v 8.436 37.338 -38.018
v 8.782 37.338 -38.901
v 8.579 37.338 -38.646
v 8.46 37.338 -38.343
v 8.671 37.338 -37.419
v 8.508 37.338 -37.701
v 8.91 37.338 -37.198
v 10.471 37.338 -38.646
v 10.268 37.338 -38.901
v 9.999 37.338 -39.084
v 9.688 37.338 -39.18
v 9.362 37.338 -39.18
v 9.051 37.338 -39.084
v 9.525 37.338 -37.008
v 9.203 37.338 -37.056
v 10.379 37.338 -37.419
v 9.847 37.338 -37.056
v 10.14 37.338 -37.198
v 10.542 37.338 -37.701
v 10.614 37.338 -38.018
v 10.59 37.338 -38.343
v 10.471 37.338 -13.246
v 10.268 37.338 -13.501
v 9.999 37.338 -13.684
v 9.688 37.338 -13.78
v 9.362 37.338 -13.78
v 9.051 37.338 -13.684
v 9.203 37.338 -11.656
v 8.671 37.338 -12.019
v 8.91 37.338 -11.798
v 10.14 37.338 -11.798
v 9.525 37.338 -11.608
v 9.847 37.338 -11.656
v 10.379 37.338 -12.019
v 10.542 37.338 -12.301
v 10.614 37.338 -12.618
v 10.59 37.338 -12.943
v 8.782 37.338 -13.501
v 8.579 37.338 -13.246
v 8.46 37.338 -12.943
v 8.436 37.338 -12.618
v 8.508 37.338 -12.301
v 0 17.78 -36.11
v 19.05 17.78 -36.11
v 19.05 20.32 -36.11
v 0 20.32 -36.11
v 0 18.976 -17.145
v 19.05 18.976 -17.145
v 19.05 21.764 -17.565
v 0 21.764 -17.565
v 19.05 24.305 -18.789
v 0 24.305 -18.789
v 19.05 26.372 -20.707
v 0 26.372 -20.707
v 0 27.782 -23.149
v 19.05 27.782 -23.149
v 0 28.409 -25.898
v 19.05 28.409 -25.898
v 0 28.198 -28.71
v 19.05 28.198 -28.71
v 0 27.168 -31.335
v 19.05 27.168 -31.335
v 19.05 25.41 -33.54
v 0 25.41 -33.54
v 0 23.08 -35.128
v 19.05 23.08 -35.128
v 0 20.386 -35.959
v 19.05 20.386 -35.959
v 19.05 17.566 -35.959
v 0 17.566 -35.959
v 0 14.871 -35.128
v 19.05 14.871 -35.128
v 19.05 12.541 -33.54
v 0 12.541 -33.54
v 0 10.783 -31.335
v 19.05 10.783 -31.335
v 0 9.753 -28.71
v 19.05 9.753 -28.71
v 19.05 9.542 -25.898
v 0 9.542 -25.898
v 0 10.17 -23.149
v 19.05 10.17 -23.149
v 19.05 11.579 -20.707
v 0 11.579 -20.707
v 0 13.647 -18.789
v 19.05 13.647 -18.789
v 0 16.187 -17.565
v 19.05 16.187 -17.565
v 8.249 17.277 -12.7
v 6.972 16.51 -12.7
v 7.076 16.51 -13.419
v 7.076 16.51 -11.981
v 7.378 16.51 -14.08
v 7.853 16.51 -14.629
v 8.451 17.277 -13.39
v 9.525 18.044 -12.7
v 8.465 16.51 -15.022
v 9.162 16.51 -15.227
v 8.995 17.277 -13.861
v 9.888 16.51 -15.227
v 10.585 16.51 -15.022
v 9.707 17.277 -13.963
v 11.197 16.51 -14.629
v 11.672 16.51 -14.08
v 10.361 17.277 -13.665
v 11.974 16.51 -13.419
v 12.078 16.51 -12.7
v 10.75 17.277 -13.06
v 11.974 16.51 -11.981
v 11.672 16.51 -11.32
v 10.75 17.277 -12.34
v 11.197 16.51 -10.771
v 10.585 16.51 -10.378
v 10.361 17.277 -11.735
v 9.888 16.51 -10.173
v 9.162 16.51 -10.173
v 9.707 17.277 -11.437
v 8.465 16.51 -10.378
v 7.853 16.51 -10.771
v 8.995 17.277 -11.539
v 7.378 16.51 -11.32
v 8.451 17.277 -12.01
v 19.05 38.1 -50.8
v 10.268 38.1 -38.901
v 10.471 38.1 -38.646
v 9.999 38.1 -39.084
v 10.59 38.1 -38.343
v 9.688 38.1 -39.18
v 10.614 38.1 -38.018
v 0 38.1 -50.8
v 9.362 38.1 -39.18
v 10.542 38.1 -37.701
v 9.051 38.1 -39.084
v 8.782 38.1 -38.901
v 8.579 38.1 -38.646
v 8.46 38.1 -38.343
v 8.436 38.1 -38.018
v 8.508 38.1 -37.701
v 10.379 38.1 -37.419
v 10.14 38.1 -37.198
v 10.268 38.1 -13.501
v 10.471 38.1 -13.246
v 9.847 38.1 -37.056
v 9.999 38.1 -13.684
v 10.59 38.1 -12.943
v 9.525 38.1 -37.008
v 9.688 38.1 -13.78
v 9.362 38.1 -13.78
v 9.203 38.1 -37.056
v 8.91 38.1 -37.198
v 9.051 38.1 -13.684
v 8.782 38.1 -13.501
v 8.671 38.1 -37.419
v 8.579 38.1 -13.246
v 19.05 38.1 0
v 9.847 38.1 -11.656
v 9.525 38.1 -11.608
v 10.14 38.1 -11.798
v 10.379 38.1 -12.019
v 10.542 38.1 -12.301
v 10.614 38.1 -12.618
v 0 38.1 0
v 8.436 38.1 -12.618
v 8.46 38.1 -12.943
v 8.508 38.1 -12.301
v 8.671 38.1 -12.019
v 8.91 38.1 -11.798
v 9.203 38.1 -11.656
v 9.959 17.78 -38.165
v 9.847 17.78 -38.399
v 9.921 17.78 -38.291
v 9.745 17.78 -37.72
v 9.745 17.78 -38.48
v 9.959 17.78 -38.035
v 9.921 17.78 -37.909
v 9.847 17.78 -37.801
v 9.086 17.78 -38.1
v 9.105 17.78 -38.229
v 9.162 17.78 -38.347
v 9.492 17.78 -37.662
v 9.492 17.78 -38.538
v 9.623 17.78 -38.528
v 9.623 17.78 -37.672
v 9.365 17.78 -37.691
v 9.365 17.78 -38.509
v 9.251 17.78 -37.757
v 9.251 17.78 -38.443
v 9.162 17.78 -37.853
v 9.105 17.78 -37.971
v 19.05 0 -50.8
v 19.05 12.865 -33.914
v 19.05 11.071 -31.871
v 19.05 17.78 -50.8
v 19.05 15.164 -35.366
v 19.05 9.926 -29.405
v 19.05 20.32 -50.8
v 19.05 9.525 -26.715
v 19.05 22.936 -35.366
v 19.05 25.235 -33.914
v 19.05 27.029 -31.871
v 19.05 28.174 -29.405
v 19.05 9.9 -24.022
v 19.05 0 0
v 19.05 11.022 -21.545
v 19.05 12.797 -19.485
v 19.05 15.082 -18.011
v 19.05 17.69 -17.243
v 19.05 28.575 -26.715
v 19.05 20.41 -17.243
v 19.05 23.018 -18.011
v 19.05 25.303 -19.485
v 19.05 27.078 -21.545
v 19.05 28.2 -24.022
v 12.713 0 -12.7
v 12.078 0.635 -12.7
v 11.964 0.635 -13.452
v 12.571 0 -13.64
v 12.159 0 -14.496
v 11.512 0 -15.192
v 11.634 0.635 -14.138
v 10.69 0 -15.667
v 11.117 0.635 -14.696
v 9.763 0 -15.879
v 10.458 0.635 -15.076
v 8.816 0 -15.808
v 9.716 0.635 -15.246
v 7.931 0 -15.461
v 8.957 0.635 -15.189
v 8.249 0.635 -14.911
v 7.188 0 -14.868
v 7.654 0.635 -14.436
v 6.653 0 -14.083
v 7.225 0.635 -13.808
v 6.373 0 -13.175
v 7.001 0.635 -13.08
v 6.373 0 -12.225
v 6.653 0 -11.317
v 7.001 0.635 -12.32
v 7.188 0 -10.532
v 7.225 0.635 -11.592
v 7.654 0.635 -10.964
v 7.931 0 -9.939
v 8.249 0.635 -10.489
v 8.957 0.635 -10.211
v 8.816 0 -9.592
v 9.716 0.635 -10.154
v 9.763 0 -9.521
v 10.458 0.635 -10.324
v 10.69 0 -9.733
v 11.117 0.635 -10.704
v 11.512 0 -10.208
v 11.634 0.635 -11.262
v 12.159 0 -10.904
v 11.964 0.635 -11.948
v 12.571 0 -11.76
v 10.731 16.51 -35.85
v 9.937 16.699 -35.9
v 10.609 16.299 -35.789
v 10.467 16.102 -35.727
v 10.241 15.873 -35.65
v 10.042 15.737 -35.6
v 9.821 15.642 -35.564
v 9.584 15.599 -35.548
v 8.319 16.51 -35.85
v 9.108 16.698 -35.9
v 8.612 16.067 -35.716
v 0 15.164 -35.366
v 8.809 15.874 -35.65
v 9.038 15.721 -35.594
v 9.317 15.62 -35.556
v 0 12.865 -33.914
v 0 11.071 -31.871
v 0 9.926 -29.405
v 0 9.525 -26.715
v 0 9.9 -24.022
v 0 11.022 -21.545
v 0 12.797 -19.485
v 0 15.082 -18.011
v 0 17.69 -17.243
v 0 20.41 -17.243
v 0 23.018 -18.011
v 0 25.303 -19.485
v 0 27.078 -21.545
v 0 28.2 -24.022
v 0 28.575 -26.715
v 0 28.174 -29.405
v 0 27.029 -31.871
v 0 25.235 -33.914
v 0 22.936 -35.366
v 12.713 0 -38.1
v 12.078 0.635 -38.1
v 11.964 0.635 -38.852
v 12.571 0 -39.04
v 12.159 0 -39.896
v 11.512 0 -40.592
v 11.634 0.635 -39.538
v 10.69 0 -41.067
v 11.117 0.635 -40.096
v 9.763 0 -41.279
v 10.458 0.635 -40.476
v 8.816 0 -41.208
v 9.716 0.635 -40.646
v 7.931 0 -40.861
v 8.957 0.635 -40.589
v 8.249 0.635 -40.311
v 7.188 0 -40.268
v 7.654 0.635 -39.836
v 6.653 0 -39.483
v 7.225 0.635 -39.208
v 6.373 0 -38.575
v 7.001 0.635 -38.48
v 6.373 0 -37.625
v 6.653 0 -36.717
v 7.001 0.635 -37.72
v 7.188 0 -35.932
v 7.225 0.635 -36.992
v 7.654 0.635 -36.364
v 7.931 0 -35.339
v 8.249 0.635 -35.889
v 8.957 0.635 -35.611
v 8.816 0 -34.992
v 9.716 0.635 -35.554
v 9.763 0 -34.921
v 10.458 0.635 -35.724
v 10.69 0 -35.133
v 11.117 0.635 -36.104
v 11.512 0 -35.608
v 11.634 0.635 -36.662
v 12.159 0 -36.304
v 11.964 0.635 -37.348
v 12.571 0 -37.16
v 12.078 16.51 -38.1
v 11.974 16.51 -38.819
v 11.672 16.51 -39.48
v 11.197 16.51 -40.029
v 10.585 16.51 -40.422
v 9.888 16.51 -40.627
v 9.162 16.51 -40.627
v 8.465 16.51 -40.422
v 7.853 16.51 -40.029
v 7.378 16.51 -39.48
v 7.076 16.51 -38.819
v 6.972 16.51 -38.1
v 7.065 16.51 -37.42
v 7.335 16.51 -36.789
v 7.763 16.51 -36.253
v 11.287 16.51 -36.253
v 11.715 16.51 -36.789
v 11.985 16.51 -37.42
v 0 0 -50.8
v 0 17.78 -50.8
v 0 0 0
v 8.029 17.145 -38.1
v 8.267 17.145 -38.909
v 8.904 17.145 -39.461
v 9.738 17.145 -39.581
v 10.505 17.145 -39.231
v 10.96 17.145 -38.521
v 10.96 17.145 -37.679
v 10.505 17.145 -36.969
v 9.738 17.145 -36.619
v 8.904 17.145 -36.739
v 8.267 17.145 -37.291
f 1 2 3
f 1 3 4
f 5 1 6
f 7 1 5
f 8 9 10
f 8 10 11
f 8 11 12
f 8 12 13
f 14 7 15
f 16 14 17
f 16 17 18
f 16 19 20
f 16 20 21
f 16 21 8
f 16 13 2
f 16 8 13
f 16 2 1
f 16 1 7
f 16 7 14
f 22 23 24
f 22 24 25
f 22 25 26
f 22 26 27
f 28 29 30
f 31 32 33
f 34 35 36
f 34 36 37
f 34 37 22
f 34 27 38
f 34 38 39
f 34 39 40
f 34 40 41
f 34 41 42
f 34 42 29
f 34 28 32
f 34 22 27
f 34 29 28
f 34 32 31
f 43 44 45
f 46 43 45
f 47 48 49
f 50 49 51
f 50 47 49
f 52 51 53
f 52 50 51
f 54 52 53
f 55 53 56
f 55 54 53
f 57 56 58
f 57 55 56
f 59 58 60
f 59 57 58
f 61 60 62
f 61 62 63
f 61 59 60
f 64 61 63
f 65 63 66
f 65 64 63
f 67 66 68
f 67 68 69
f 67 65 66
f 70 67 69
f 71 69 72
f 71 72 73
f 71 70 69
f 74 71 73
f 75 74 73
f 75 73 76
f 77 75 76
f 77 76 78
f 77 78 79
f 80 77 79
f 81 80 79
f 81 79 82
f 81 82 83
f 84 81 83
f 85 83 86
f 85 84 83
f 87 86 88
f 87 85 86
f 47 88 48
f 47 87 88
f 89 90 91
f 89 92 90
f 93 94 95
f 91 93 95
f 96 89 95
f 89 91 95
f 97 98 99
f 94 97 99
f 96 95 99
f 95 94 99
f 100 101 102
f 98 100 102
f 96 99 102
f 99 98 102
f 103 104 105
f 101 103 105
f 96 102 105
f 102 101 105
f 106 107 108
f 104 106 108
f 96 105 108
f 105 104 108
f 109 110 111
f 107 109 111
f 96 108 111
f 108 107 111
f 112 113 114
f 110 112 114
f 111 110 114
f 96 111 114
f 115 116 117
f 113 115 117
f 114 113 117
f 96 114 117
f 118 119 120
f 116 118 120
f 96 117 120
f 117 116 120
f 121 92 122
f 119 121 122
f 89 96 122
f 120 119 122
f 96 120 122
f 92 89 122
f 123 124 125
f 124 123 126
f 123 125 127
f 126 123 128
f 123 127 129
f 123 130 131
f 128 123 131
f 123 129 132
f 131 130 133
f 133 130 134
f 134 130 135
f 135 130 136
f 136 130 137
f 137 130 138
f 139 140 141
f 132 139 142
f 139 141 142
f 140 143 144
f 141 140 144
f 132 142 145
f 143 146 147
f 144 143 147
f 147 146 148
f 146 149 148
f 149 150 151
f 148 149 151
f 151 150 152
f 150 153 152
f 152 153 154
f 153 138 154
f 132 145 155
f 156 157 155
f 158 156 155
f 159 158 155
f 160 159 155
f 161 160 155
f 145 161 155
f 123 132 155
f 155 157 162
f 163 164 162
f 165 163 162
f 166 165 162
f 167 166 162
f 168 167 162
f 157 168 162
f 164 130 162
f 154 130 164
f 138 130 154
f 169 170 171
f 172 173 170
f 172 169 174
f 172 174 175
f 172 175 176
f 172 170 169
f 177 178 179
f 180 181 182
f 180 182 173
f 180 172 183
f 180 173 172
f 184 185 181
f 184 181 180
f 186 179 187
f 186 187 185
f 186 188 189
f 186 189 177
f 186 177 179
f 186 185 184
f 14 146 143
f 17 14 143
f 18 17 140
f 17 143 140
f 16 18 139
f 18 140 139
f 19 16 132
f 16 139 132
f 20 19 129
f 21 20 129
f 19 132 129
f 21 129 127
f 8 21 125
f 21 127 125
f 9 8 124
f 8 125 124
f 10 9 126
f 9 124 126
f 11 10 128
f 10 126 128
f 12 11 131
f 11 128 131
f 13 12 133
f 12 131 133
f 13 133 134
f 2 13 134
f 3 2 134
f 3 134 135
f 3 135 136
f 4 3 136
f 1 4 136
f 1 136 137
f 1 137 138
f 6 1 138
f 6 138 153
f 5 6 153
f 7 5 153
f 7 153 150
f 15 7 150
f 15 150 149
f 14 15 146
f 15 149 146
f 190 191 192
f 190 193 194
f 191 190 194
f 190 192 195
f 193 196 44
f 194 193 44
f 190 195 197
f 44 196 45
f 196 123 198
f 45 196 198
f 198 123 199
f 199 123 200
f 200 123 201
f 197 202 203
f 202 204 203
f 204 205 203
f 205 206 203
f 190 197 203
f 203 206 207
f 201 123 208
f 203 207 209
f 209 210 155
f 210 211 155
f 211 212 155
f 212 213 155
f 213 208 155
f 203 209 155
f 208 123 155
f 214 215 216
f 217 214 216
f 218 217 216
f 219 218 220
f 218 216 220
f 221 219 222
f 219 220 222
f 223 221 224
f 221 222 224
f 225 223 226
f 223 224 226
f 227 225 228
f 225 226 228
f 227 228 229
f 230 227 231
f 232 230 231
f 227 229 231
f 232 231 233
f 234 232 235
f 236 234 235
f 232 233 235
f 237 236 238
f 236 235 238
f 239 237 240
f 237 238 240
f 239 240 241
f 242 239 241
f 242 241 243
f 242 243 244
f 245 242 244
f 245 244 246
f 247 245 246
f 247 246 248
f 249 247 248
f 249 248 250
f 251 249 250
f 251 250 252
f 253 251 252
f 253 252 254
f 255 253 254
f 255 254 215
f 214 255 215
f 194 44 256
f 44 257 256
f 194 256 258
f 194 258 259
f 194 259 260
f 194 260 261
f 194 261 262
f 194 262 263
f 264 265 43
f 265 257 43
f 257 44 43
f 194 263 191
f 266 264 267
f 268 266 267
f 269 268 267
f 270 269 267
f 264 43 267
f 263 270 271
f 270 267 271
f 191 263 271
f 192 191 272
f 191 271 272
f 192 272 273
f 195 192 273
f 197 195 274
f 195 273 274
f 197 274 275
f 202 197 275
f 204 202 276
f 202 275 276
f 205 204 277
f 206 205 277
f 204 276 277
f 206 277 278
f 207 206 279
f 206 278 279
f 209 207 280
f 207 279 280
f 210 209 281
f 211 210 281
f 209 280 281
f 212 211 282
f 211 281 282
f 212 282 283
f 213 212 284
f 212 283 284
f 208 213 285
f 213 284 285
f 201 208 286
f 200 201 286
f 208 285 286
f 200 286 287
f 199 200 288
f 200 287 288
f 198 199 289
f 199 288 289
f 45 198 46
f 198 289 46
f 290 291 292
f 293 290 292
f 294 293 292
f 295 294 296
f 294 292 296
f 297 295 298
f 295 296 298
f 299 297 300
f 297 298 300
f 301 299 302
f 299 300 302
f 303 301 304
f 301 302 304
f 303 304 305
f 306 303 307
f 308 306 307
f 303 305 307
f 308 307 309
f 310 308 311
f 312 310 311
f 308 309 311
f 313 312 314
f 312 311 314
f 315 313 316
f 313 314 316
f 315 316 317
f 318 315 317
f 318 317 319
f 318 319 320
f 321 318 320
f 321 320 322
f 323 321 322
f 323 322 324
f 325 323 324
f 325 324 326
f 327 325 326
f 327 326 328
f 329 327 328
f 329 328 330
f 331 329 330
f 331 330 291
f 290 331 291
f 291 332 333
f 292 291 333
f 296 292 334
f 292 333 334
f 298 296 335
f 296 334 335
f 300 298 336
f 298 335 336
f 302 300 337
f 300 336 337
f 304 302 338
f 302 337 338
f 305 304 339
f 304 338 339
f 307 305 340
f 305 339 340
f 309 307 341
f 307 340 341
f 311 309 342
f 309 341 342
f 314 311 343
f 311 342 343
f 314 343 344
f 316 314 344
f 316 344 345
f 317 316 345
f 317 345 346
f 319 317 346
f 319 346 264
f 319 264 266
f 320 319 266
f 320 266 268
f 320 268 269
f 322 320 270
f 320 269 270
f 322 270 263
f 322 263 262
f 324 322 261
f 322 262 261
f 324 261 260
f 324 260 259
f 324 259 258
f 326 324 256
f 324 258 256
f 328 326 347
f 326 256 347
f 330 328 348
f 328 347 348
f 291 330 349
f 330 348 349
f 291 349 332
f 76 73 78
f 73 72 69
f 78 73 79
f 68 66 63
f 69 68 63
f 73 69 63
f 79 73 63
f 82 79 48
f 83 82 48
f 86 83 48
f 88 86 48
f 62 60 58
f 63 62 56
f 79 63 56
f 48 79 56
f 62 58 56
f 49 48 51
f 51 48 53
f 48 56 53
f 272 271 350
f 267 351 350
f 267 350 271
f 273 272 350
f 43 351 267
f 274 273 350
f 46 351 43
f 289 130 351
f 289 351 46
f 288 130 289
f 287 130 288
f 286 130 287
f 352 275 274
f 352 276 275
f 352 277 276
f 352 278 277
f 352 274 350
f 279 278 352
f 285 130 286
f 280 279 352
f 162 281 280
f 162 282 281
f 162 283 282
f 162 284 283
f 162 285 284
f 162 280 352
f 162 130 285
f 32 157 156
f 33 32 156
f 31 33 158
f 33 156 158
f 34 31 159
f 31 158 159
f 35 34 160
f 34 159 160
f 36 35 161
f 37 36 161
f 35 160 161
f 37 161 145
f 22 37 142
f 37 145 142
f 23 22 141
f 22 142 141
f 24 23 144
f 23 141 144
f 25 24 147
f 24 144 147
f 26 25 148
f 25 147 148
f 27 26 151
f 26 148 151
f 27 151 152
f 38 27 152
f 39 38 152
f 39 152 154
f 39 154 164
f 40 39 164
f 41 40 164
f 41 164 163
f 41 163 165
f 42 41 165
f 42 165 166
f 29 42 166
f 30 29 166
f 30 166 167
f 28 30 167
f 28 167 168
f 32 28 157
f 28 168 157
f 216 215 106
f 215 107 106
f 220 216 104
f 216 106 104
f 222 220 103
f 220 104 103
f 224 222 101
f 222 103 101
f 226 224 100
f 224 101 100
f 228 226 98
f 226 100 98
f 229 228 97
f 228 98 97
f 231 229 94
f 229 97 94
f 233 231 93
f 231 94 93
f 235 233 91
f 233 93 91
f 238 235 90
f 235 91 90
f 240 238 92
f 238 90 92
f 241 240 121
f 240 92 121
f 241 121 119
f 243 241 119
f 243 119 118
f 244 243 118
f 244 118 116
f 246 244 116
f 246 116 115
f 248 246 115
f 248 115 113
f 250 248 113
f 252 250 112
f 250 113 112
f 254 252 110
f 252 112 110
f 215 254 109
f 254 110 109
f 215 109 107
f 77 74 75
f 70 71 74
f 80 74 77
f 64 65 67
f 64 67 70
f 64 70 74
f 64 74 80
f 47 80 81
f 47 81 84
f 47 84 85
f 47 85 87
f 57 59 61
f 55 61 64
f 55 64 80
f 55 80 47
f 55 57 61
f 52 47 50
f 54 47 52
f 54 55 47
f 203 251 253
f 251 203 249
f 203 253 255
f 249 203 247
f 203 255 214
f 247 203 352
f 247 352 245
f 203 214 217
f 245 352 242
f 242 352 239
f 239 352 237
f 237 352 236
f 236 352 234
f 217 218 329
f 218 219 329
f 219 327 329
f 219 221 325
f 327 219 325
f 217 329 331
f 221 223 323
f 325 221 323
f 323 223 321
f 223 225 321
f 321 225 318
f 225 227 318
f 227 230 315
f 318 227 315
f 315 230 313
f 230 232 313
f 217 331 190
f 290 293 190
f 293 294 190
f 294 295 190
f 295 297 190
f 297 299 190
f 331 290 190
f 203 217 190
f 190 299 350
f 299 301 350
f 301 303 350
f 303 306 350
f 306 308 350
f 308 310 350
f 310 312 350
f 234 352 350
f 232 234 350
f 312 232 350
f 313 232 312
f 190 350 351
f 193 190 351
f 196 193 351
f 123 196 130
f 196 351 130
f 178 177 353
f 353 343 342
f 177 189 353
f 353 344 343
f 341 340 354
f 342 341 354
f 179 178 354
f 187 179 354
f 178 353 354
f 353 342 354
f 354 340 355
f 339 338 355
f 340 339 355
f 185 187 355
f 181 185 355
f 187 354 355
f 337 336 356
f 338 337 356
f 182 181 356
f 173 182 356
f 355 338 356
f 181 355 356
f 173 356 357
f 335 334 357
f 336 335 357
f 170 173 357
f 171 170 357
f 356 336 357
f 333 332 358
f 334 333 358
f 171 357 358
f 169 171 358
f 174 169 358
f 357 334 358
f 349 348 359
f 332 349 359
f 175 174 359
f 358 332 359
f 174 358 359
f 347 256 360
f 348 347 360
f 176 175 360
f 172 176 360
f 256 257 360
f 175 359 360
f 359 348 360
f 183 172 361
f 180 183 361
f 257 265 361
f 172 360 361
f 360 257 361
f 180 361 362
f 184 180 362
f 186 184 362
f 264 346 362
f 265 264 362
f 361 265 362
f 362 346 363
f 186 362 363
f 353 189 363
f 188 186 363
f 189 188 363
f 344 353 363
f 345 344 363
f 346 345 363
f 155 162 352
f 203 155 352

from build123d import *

# Parameters (mm, degrees)
BOSS_EXTRUDE1_DEPTH               = 19.05
F_1_4_20_TAPPED_HOLE1_D           = 5.1054
F_1_4_20_TAPPED_HOLE1_DEPTH       = 16.51
F_1_4_20_TAPPED_HOLE1_CSINK_D     = 6.3754
F_1_4_20_TAPPED_HOLE1_CSINK_ANGLE = 90
F_1_4_20_TAPPED_HOLE1_TIP         = 1.533816902
SKETCH10_R                        = 9.459955788
BOSS_EXTRUDE2_DEPTH               = 19.05
SKETCH11_W                        = 14.690046345
SKETCH11_H                        = 2.54
BOSS_EXTRUDE3_DEPTH               = 19.05
SKETCH8_R                         = 1.0922
CUT_EXTRUDE4_DEPTH                = 0.762


with BuildPart() as part:
    # Sketch2 → Boss-Extrude1 (new body)
    with BuildSketch(Plane(origin=(0, 0, 0), x_dir=(0, 0, -1), z_dir=(1, 0, 0))):
        with BuildLine():
            Line((0, 0), (50.8, 0))
            Line((50.8, 0), (50.8, 17.78))
            Line((50.8, 17.78), (36.109953655, 17.78))
            ThreePointArc((36.109953655, 17.78), (17.145, 19.05), (36.109953655, 20.32))
            Line((36.109953655, 20.32), (50.8, 20.32))
            Line((50.8, 20.32), (50.8, 38.1))
            Line((50.8, 38.1), (0, 38.1))
            Line((0, 38.1), (0, 0))
        make_face()
    extrude(amount=BOSS_EXTRUDE1_DEPTH)

    # 1/4-20 Tapped Hole1
    with Locations(Plane(origin=(0, 0, 0), x_dir=(-1, 0, 0), z_dir=(0, -1, 0))):
        with Locations((-9.525, 12.7), (-9.525, 38.1)):
            CounterSinkHole(F_1_4_20_TAPPED_HOLE1_D / 2, F_1_4_20_TAPPED_HOLE1_CSINK_D / 2, depth=F_1_4_20_TAPPED_HOLE1_DEPTH, counter_sink_angle=F_1_4_20_TAPPED_HOLE1_CSINK_ANGLE)
            with Locations((0, 0, -(F_1_4_20_TAPPED_HOLE1_DEPTH + F_1_4_20_TAPPED_HOLE1_TIP / 2))):  # 118° drill point
                Cone(0, F_1_4_20_TAPPED_HOLE1_D / 2, F_1_4_20_TAPPED_HOLE1_TIP, mode=Mode.SUBTRACT)

    # Sketch11 → Boss-Extrude3 (add)
    with BuildSketch(Plane.ZY):
        with Locations((-43.454976828, 19.05)):
            Rectangle(SKETCH11_W, SKETCH11_H)
    extrude(amount=-BOSS_EXTRUDE3_DEPTH)

    # Sketch8 → Cut-Extrude4 (cut)
    with BuildSketch(Plane(origin=(0, 38.1, 0), x_dir=(1, 0, 0), z_dir=(0, 1, 0))):
        with Locations((9.525, 12.7)):
            Circle(SKETCH8_R)
        with Locations((9.525, 38.1)):
            Circle(SKETCH8_R)
    extrude(amount=-CUT_EXTRUDE4_DEPTH, mode=Mode.SUBTRACT)


with BuildPart() as body_2:
    # Sketch10 → Boss-Extrude2 (new body)
    with BuildSketch(Plane(origin=(0, -2.659795234, 0), x_dir=(0, 0, 1), z_dir=(-1, 0, 0))):
        with Locations((-26.60495728, 21.63538199)):
            Circle(SKETCH10_R)
    extrude(amount=-BOSS_EXTRUDE2_DEPTH)


solid = Compound([part.part, body_2.part])
